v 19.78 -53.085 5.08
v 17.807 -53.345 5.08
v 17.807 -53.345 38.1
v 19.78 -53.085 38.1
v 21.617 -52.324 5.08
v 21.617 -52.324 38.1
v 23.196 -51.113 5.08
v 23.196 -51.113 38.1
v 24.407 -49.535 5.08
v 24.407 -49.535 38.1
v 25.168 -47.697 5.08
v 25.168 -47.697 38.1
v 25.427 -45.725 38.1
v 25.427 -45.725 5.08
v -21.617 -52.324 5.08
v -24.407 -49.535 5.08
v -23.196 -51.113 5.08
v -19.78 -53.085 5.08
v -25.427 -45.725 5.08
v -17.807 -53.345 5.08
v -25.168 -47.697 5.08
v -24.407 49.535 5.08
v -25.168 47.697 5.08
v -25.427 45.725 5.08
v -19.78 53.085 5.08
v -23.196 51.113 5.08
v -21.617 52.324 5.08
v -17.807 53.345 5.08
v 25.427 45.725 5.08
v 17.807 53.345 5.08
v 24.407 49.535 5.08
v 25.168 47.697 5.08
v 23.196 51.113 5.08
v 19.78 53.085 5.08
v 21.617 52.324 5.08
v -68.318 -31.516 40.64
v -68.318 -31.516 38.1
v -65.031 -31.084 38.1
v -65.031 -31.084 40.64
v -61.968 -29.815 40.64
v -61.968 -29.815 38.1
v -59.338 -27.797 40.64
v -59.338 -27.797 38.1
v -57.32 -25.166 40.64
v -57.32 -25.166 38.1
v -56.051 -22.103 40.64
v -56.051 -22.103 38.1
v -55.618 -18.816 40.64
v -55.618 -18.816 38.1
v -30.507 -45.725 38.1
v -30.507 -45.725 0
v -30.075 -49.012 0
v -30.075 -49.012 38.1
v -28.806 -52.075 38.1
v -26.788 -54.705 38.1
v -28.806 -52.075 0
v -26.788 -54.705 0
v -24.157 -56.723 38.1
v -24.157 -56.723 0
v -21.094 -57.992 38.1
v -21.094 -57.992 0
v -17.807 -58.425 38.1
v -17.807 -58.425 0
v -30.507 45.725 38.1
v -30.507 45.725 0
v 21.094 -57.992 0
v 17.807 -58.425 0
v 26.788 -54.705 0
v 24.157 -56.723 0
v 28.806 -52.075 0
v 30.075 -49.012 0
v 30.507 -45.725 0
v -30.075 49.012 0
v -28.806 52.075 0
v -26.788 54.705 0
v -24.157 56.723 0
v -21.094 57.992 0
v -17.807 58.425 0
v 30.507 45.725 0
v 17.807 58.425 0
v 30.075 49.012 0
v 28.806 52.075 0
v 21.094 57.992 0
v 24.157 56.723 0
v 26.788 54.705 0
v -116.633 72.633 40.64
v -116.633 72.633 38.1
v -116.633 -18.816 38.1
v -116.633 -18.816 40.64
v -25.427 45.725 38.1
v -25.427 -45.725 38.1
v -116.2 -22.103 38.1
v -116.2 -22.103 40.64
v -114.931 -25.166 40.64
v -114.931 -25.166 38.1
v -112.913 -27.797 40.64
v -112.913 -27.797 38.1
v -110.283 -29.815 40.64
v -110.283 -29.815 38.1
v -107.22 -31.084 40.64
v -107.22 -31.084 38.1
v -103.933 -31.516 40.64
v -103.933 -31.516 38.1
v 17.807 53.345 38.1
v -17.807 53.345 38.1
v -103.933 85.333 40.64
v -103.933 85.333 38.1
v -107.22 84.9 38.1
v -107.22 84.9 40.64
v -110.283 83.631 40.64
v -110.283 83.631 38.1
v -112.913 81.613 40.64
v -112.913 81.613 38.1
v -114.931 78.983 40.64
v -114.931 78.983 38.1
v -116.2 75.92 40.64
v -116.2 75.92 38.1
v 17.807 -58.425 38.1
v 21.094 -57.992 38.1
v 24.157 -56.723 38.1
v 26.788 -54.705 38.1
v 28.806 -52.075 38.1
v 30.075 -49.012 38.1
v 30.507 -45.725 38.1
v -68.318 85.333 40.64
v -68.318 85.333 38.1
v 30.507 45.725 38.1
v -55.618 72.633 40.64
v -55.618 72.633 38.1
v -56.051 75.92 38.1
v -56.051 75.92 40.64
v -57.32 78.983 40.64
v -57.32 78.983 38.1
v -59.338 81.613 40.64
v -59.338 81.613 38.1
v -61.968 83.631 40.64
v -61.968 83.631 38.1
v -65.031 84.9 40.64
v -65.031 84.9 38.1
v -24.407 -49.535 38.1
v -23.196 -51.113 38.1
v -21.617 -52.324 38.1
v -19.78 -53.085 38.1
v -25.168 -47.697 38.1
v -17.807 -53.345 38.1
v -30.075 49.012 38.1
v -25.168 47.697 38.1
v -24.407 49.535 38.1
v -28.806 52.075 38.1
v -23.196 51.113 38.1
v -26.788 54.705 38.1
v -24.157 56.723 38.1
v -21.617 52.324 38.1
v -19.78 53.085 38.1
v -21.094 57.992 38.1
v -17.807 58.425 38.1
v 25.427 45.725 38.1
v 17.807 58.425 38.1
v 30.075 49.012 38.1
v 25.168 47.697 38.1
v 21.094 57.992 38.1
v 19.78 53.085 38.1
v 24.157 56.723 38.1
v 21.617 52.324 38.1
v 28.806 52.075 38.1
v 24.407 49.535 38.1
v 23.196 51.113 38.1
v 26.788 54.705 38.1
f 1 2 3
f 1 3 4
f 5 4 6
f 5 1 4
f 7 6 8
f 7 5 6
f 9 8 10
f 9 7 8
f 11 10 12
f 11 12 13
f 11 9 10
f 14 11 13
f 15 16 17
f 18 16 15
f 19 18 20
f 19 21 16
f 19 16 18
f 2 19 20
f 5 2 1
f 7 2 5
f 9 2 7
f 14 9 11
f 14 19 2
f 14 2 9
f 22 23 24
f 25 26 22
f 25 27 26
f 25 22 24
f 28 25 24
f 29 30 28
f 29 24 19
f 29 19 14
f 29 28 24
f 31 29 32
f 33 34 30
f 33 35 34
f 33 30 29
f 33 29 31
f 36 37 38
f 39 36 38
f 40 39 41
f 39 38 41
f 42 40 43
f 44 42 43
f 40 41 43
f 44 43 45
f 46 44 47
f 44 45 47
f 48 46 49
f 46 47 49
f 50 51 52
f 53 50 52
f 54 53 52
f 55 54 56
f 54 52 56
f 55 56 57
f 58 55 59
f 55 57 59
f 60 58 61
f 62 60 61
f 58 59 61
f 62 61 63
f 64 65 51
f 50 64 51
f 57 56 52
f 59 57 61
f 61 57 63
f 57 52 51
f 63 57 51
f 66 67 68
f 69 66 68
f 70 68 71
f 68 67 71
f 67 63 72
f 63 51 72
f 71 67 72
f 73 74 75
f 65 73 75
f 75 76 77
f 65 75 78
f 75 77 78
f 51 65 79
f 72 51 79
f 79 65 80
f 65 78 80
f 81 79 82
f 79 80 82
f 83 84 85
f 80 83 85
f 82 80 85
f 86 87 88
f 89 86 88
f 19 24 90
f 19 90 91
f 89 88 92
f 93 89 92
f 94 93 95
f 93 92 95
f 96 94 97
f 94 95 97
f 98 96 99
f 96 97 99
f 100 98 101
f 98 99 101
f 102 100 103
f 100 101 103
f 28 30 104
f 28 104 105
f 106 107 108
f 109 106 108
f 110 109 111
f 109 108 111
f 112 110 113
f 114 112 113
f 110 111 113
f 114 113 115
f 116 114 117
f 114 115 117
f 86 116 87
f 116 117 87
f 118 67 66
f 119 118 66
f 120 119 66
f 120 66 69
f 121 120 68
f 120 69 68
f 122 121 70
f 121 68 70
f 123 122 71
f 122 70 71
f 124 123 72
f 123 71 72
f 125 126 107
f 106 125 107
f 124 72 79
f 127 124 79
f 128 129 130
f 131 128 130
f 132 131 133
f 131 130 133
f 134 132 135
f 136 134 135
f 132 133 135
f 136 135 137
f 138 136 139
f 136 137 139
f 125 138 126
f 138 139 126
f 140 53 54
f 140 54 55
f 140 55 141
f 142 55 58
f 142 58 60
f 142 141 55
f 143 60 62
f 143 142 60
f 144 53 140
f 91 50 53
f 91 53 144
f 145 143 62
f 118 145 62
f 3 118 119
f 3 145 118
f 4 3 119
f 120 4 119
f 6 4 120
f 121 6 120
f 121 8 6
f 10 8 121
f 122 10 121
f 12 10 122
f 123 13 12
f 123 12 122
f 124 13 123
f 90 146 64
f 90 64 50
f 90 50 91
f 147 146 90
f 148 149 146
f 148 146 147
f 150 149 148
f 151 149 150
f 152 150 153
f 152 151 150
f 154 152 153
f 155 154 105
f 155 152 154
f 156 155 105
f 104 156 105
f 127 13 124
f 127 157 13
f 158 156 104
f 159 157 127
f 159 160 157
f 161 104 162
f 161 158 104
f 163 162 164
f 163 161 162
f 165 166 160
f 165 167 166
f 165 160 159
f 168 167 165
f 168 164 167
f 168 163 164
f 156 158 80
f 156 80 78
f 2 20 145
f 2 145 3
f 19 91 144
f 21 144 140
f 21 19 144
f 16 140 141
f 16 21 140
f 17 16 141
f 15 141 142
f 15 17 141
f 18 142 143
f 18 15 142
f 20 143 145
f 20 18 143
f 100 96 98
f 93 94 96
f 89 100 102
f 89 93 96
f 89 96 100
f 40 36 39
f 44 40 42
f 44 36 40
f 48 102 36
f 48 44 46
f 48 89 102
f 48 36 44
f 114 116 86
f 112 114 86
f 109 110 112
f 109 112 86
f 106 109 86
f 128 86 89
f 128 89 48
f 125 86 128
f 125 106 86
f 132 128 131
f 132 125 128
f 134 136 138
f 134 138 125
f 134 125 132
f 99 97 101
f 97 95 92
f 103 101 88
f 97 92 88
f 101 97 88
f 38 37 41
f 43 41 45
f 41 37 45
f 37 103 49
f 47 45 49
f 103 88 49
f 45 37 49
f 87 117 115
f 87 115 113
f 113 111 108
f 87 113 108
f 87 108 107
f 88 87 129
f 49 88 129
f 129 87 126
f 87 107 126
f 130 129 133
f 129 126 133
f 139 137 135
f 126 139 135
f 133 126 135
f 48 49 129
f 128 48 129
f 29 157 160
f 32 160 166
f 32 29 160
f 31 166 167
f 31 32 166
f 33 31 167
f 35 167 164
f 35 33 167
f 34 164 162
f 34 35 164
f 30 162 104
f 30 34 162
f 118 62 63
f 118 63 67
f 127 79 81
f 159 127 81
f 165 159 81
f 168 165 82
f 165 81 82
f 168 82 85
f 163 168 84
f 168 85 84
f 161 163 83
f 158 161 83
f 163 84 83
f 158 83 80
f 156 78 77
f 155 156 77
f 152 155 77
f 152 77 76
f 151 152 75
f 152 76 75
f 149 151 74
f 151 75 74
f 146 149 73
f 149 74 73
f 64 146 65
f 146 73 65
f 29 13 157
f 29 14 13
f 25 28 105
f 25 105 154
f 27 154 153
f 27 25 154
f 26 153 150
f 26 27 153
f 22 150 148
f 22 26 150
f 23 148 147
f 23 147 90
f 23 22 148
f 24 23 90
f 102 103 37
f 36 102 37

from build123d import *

# Parameters (mm, degrees)
F1_DEPTH = 38.1
F2_T     = -5.08
F4_DEPTH = 2.54


with BuildPart() as f1:
    # F0 (on Top) → F1 (new body)
    with BuildSketch(Plane.XY):
        with BuildLine():
            ThreePointArc((30.507412, 45.72457), (26.787668, 54.704826), (17.807412, 58.42457))
            Line((17.807412, 58.42457), (-17.807412, 58.42457))
            ThreePointArc((-17.807412, 58.42457), (-26.787668, 54.704826), (-30.507412, 45.72457))
            Line((-30.507412, 45.72457), (-30.507412, -45.72457))
            ThreePointArc((-30.507412, -45.72457), (-26.787668, -54.704826), (-17.807412, -58.42457))
            Line((-17.807412, -58.42457), (17.807412, -58.42457))
            ThreePointArc((17.807412, -58.42457), (26.787668, -54.704826), (30.507412, -45.72457))
            Line((30.507412, -45.72457), (30.507412, 45.72457))
        make_face()
    extrude(amount=F1_DEPTH)

    # F2
    f2_openings = [f1.faces().sort_by_distance(p)[0] for p in [
        (0, 0, 38.1),
    ]]
    offset(amount=F2_T, openings=f2_openings)


with BuildPart() as f4:
    # F3 (on face) → F4 (new body)
    with BuildSketch(Plane.XY.offset(38.1)):
        with BuildLine():
            ThreePointArc((-55.618133, 72.632677), (-59.337877, 81.612933), (-68.318133, 85.332677))
            Line((-68.318133, 85.332677), (-103.932957, 85.332677))
            ThreePointArc((-103.932957, 85.332677), (-112.913213, 81.612933), (-116.632957, 72.632677))
            Line((-116.632957, 72.632677), (-116.632957, -18.816463))
            ThreePointArc((-116.632957, -18.816463), (-112.913213, -27.796719), (-103.932957, -31.516463))
            Line((-103.932957, -31.516463), (-68.318133, -31.516463))
            ThreePointArc((-68.318133, -31.516463), (-59.337877, -27.796719), (-55.618133, -18.816463))
            Line((-55.618133, -18.816463), (-55.618133, 72.632677))
        make_face()
    extrude(amount=F4_DEPTH)


solid = Compound([f1.part, f4.part])
